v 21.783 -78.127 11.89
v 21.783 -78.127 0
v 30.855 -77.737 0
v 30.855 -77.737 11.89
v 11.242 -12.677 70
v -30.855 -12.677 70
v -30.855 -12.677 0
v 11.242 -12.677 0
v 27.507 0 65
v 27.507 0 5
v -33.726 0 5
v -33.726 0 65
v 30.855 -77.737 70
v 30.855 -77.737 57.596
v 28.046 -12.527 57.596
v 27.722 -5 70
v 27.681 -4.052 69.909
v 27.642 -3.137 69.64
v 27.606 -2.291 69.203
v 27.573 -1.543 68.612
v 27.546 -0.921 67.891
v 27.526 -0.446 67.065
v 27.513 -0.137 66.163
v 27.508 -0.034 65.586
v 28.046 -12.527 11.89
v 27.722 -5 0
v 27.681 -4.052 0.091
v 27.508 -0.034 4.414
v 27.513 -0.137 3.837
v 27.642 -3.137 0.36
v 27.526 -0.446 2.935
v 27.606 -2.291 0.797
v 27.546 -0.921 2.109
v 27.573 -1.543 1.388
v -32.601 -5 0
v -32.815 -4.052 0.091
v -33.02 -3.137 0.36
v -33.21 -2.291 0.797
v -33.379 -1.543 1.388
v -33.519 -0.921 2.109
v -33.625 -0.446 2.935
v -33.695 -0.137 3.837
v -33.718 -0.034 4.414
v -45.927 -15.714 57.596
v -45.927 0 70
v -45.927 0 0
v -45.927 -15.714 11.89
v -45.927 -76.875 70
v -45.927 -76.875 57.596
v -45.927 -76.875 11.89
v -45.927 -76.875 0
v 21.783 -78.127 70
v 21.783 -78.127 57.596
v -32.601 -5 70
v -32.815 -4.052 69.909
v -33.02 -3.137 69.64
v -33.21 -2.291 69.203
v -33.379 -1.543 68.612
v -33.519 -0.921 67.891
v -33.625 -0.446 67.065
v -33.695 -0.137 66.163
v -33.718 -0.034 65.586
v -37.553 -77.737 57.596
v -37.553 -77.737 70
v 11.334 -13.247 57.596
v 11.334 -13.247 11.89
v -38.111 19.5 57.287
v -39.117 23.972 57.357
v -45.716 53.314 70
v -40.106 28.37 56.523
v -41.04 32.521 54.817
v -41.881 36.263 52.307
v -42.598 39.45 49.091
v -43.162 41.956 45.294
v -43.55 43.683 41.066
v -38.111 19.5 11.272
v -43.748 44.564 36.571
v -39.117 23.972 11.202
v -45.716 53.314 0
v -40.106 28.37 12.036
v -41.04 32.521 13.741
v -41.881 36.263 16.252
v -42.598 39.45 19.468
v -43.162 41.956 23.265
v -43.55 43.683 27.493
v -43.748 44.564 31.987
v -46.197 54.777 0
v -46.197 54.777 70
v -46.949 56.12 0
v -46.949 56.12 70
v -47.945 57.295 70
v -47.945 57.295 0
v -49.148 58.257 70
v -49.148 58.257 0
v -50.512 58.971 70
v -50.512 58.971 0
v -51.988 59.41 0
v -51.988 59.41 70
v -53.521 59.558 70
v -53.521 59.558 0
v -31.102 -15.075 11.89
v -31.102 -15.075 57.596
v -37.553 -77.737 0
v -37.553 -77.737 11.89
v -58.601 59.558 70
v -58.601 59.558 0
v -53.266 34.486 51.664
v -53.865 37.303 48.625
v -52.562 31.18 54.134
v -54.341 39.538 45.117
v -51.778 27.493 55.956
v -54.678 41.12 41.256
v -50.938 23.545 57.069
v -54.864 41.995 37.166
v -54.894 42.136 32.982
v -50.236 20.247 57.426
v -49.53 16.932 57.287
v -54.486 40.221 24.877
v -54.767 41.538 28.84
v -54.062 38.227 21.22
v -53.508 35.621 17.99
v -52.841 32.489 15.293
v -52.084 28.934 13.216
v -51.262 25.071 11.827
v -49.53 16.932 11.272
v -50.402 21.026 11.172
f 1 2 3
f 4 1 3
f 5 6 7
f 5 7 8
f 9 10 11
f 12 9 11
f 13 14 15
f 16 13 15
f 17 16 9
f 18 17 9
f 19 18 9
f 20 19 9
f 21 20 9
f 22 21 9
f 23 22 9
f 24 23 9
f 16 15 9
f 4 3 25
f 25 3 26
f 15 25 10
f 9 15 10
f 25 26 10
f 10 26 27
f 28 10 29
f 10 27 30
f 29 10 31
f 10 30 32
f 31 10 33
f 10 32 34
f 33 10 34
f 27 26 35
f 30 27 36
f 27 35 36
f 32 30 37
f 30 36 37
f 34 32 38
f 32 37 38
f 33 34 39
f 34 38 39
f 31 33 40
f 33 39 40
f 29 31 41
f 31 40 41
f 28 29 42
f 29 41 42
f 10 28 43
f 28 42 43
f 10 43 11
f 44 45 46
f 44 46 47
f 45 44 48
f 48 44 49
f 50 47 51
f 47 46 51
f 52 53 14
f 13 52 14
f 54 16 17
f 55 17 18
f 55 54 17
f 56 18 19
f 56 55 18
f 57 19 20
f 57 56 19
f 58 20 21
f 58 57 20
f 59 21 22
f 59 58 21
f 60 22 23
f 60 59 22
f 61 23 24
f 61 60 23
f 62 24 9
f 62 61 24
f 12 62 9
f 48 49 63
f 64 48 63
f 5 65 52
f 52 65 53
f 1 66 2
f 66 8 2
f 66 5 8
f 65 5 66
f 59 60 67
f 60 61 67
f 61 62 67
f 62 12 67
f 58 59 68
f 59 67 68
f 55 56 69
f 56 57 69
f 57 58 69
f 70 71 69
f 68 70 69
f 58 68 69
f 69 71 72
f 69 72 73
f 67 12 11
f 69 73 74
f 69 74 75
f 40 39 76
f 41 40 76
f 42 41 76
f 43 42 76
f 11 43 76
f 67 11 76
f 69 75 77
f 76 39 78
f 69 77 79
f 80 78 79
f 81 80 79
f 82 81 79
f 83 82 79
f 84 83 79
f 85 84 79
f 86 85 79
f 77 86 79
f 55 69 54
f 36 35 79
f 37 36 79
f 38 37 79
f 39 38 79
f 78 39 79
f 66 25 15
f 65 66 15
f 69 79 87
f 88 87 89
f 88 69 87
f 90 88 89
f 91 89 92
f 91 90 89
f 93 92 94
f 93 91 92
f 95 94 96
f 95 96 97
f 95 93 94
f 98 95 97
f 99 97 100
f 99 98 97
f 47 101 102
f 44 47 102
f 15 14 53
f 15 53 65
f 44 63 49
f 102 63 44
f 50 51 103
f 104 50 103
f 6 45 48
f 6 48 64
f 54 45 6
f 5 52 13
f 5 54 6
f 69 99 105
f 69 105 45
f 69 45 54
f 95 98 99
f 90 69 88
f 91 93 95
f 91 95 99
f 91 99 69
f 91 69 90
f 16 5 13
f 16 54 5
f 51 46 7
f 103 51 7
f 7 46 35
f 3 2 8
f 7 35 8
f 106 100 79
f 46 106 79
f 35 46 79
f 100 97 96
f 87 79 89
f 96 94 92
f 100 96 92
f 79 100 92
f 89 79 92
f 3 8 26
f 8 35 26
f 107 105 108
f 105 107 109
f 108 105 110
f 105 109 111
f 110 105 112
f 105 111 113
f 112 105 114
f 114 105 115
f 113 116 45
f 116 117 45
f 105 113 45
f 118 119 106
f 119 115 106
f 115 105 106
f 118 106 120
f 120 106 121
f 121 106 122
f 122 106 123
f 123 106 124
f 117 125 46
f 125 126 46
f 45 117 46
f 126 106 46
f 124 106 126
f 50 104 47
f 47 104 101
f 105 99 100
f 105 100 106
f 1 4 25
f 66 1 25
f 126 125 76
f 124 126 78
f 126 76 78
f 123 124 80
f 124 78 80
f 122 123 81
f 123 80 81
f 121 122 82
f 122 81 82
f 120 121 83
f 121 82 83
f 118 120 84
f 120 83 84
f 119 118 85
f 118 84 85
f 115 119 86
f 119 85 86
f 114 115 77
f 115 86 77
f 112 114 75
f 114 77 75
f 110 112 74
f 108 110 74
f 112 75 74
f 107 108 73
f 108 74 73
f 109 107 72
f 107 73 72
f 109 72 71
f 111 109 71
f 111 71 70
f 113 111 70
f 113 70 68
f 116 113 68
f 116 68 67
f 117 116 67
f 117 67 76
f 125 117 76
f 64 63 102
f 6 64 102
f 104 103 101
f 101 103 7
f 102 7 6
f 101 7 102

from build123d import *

# Parameters (mm, degrees)
F1_DEPTH = 70
F2_W     = 65.2701610255
F2_H     = 45.7058856264
F3_DEPTH = 127.5
F5_DEPTH = 41.3
F6_R     = 5
F7_R     = 8


with BuildPart() as f1:
    # F0 (on Top) → F1 (new body)
    with BuildSketch(Plane.XY):
        Polygon((-47.1203699708, 59.5582462847), (-58.6014762521, 59.5582462847), (-45.9271341588, 0), (-45.9271341588, -76.8745874723), (-37.5527814031, -77.7366533875), (-30.855467543, -12.6770474017), (11.2419202924, -12.6770474017), (21.7831026724, -78.1274641837), (30.8554805815, -77.7366533875), (27.5068189949, 0), (-33.725745976, 0), align=None)
    extrude(amount=F1_DEPTH)

    # F2 (on face) → F3 (cut)
    with BuildSketch(Plane(origin=(27.4558711207, 1.1827164786, 0), x_dir=(-0.0430370851, 0.9990734754, 0), z_dir=(0.9990734754, 0.0430370851, 0))):
        with Locations((-46.3574778998, 34.742649179)):
            Rectangle(F2_W, F2_H)
    extrude(amount=-F3_DEPTH, mode=Mode.SUBTRACT)

    # F4 (on face) → F5 (cut)
    with BuildSketch(Plane(origin=(-32.1020311258, -7.2197330046, 0), x_dir=(-0.2194189331, 0.9756307354, 0), z_dir=(0.9756307354, 0.2194189331, 0))):
        with BuildLine():
            Line((27.3875570842, 57.2867691517), (27.3875570842, 11.2720606849))
            ThreePointArc((27.3875570842, 11.2720606849), (53.1906745676, 34.2794149183), (27.3875570842, 57.2867691517))
        make_face()
    extrude(amount=-F5_DEPTH, mode=Mode.SUBTRACT)

    # F6
    f6_edges = [f1.edges().sort_by_distance(p)[0] for p in [
        (-3.109463, 0, 0),
        (-3.109463, 0, 70),
    ]]
    fillet(f6_edges, radius=F6_R)

    # F7
    f7_edges = [f1.edges().sort_by_distance(p)[0] for p in [
        (-47.12037, 59.558246, 35),
    ]]
    fillet(f7_edges, radius=F7_R)


solid = f1.part
